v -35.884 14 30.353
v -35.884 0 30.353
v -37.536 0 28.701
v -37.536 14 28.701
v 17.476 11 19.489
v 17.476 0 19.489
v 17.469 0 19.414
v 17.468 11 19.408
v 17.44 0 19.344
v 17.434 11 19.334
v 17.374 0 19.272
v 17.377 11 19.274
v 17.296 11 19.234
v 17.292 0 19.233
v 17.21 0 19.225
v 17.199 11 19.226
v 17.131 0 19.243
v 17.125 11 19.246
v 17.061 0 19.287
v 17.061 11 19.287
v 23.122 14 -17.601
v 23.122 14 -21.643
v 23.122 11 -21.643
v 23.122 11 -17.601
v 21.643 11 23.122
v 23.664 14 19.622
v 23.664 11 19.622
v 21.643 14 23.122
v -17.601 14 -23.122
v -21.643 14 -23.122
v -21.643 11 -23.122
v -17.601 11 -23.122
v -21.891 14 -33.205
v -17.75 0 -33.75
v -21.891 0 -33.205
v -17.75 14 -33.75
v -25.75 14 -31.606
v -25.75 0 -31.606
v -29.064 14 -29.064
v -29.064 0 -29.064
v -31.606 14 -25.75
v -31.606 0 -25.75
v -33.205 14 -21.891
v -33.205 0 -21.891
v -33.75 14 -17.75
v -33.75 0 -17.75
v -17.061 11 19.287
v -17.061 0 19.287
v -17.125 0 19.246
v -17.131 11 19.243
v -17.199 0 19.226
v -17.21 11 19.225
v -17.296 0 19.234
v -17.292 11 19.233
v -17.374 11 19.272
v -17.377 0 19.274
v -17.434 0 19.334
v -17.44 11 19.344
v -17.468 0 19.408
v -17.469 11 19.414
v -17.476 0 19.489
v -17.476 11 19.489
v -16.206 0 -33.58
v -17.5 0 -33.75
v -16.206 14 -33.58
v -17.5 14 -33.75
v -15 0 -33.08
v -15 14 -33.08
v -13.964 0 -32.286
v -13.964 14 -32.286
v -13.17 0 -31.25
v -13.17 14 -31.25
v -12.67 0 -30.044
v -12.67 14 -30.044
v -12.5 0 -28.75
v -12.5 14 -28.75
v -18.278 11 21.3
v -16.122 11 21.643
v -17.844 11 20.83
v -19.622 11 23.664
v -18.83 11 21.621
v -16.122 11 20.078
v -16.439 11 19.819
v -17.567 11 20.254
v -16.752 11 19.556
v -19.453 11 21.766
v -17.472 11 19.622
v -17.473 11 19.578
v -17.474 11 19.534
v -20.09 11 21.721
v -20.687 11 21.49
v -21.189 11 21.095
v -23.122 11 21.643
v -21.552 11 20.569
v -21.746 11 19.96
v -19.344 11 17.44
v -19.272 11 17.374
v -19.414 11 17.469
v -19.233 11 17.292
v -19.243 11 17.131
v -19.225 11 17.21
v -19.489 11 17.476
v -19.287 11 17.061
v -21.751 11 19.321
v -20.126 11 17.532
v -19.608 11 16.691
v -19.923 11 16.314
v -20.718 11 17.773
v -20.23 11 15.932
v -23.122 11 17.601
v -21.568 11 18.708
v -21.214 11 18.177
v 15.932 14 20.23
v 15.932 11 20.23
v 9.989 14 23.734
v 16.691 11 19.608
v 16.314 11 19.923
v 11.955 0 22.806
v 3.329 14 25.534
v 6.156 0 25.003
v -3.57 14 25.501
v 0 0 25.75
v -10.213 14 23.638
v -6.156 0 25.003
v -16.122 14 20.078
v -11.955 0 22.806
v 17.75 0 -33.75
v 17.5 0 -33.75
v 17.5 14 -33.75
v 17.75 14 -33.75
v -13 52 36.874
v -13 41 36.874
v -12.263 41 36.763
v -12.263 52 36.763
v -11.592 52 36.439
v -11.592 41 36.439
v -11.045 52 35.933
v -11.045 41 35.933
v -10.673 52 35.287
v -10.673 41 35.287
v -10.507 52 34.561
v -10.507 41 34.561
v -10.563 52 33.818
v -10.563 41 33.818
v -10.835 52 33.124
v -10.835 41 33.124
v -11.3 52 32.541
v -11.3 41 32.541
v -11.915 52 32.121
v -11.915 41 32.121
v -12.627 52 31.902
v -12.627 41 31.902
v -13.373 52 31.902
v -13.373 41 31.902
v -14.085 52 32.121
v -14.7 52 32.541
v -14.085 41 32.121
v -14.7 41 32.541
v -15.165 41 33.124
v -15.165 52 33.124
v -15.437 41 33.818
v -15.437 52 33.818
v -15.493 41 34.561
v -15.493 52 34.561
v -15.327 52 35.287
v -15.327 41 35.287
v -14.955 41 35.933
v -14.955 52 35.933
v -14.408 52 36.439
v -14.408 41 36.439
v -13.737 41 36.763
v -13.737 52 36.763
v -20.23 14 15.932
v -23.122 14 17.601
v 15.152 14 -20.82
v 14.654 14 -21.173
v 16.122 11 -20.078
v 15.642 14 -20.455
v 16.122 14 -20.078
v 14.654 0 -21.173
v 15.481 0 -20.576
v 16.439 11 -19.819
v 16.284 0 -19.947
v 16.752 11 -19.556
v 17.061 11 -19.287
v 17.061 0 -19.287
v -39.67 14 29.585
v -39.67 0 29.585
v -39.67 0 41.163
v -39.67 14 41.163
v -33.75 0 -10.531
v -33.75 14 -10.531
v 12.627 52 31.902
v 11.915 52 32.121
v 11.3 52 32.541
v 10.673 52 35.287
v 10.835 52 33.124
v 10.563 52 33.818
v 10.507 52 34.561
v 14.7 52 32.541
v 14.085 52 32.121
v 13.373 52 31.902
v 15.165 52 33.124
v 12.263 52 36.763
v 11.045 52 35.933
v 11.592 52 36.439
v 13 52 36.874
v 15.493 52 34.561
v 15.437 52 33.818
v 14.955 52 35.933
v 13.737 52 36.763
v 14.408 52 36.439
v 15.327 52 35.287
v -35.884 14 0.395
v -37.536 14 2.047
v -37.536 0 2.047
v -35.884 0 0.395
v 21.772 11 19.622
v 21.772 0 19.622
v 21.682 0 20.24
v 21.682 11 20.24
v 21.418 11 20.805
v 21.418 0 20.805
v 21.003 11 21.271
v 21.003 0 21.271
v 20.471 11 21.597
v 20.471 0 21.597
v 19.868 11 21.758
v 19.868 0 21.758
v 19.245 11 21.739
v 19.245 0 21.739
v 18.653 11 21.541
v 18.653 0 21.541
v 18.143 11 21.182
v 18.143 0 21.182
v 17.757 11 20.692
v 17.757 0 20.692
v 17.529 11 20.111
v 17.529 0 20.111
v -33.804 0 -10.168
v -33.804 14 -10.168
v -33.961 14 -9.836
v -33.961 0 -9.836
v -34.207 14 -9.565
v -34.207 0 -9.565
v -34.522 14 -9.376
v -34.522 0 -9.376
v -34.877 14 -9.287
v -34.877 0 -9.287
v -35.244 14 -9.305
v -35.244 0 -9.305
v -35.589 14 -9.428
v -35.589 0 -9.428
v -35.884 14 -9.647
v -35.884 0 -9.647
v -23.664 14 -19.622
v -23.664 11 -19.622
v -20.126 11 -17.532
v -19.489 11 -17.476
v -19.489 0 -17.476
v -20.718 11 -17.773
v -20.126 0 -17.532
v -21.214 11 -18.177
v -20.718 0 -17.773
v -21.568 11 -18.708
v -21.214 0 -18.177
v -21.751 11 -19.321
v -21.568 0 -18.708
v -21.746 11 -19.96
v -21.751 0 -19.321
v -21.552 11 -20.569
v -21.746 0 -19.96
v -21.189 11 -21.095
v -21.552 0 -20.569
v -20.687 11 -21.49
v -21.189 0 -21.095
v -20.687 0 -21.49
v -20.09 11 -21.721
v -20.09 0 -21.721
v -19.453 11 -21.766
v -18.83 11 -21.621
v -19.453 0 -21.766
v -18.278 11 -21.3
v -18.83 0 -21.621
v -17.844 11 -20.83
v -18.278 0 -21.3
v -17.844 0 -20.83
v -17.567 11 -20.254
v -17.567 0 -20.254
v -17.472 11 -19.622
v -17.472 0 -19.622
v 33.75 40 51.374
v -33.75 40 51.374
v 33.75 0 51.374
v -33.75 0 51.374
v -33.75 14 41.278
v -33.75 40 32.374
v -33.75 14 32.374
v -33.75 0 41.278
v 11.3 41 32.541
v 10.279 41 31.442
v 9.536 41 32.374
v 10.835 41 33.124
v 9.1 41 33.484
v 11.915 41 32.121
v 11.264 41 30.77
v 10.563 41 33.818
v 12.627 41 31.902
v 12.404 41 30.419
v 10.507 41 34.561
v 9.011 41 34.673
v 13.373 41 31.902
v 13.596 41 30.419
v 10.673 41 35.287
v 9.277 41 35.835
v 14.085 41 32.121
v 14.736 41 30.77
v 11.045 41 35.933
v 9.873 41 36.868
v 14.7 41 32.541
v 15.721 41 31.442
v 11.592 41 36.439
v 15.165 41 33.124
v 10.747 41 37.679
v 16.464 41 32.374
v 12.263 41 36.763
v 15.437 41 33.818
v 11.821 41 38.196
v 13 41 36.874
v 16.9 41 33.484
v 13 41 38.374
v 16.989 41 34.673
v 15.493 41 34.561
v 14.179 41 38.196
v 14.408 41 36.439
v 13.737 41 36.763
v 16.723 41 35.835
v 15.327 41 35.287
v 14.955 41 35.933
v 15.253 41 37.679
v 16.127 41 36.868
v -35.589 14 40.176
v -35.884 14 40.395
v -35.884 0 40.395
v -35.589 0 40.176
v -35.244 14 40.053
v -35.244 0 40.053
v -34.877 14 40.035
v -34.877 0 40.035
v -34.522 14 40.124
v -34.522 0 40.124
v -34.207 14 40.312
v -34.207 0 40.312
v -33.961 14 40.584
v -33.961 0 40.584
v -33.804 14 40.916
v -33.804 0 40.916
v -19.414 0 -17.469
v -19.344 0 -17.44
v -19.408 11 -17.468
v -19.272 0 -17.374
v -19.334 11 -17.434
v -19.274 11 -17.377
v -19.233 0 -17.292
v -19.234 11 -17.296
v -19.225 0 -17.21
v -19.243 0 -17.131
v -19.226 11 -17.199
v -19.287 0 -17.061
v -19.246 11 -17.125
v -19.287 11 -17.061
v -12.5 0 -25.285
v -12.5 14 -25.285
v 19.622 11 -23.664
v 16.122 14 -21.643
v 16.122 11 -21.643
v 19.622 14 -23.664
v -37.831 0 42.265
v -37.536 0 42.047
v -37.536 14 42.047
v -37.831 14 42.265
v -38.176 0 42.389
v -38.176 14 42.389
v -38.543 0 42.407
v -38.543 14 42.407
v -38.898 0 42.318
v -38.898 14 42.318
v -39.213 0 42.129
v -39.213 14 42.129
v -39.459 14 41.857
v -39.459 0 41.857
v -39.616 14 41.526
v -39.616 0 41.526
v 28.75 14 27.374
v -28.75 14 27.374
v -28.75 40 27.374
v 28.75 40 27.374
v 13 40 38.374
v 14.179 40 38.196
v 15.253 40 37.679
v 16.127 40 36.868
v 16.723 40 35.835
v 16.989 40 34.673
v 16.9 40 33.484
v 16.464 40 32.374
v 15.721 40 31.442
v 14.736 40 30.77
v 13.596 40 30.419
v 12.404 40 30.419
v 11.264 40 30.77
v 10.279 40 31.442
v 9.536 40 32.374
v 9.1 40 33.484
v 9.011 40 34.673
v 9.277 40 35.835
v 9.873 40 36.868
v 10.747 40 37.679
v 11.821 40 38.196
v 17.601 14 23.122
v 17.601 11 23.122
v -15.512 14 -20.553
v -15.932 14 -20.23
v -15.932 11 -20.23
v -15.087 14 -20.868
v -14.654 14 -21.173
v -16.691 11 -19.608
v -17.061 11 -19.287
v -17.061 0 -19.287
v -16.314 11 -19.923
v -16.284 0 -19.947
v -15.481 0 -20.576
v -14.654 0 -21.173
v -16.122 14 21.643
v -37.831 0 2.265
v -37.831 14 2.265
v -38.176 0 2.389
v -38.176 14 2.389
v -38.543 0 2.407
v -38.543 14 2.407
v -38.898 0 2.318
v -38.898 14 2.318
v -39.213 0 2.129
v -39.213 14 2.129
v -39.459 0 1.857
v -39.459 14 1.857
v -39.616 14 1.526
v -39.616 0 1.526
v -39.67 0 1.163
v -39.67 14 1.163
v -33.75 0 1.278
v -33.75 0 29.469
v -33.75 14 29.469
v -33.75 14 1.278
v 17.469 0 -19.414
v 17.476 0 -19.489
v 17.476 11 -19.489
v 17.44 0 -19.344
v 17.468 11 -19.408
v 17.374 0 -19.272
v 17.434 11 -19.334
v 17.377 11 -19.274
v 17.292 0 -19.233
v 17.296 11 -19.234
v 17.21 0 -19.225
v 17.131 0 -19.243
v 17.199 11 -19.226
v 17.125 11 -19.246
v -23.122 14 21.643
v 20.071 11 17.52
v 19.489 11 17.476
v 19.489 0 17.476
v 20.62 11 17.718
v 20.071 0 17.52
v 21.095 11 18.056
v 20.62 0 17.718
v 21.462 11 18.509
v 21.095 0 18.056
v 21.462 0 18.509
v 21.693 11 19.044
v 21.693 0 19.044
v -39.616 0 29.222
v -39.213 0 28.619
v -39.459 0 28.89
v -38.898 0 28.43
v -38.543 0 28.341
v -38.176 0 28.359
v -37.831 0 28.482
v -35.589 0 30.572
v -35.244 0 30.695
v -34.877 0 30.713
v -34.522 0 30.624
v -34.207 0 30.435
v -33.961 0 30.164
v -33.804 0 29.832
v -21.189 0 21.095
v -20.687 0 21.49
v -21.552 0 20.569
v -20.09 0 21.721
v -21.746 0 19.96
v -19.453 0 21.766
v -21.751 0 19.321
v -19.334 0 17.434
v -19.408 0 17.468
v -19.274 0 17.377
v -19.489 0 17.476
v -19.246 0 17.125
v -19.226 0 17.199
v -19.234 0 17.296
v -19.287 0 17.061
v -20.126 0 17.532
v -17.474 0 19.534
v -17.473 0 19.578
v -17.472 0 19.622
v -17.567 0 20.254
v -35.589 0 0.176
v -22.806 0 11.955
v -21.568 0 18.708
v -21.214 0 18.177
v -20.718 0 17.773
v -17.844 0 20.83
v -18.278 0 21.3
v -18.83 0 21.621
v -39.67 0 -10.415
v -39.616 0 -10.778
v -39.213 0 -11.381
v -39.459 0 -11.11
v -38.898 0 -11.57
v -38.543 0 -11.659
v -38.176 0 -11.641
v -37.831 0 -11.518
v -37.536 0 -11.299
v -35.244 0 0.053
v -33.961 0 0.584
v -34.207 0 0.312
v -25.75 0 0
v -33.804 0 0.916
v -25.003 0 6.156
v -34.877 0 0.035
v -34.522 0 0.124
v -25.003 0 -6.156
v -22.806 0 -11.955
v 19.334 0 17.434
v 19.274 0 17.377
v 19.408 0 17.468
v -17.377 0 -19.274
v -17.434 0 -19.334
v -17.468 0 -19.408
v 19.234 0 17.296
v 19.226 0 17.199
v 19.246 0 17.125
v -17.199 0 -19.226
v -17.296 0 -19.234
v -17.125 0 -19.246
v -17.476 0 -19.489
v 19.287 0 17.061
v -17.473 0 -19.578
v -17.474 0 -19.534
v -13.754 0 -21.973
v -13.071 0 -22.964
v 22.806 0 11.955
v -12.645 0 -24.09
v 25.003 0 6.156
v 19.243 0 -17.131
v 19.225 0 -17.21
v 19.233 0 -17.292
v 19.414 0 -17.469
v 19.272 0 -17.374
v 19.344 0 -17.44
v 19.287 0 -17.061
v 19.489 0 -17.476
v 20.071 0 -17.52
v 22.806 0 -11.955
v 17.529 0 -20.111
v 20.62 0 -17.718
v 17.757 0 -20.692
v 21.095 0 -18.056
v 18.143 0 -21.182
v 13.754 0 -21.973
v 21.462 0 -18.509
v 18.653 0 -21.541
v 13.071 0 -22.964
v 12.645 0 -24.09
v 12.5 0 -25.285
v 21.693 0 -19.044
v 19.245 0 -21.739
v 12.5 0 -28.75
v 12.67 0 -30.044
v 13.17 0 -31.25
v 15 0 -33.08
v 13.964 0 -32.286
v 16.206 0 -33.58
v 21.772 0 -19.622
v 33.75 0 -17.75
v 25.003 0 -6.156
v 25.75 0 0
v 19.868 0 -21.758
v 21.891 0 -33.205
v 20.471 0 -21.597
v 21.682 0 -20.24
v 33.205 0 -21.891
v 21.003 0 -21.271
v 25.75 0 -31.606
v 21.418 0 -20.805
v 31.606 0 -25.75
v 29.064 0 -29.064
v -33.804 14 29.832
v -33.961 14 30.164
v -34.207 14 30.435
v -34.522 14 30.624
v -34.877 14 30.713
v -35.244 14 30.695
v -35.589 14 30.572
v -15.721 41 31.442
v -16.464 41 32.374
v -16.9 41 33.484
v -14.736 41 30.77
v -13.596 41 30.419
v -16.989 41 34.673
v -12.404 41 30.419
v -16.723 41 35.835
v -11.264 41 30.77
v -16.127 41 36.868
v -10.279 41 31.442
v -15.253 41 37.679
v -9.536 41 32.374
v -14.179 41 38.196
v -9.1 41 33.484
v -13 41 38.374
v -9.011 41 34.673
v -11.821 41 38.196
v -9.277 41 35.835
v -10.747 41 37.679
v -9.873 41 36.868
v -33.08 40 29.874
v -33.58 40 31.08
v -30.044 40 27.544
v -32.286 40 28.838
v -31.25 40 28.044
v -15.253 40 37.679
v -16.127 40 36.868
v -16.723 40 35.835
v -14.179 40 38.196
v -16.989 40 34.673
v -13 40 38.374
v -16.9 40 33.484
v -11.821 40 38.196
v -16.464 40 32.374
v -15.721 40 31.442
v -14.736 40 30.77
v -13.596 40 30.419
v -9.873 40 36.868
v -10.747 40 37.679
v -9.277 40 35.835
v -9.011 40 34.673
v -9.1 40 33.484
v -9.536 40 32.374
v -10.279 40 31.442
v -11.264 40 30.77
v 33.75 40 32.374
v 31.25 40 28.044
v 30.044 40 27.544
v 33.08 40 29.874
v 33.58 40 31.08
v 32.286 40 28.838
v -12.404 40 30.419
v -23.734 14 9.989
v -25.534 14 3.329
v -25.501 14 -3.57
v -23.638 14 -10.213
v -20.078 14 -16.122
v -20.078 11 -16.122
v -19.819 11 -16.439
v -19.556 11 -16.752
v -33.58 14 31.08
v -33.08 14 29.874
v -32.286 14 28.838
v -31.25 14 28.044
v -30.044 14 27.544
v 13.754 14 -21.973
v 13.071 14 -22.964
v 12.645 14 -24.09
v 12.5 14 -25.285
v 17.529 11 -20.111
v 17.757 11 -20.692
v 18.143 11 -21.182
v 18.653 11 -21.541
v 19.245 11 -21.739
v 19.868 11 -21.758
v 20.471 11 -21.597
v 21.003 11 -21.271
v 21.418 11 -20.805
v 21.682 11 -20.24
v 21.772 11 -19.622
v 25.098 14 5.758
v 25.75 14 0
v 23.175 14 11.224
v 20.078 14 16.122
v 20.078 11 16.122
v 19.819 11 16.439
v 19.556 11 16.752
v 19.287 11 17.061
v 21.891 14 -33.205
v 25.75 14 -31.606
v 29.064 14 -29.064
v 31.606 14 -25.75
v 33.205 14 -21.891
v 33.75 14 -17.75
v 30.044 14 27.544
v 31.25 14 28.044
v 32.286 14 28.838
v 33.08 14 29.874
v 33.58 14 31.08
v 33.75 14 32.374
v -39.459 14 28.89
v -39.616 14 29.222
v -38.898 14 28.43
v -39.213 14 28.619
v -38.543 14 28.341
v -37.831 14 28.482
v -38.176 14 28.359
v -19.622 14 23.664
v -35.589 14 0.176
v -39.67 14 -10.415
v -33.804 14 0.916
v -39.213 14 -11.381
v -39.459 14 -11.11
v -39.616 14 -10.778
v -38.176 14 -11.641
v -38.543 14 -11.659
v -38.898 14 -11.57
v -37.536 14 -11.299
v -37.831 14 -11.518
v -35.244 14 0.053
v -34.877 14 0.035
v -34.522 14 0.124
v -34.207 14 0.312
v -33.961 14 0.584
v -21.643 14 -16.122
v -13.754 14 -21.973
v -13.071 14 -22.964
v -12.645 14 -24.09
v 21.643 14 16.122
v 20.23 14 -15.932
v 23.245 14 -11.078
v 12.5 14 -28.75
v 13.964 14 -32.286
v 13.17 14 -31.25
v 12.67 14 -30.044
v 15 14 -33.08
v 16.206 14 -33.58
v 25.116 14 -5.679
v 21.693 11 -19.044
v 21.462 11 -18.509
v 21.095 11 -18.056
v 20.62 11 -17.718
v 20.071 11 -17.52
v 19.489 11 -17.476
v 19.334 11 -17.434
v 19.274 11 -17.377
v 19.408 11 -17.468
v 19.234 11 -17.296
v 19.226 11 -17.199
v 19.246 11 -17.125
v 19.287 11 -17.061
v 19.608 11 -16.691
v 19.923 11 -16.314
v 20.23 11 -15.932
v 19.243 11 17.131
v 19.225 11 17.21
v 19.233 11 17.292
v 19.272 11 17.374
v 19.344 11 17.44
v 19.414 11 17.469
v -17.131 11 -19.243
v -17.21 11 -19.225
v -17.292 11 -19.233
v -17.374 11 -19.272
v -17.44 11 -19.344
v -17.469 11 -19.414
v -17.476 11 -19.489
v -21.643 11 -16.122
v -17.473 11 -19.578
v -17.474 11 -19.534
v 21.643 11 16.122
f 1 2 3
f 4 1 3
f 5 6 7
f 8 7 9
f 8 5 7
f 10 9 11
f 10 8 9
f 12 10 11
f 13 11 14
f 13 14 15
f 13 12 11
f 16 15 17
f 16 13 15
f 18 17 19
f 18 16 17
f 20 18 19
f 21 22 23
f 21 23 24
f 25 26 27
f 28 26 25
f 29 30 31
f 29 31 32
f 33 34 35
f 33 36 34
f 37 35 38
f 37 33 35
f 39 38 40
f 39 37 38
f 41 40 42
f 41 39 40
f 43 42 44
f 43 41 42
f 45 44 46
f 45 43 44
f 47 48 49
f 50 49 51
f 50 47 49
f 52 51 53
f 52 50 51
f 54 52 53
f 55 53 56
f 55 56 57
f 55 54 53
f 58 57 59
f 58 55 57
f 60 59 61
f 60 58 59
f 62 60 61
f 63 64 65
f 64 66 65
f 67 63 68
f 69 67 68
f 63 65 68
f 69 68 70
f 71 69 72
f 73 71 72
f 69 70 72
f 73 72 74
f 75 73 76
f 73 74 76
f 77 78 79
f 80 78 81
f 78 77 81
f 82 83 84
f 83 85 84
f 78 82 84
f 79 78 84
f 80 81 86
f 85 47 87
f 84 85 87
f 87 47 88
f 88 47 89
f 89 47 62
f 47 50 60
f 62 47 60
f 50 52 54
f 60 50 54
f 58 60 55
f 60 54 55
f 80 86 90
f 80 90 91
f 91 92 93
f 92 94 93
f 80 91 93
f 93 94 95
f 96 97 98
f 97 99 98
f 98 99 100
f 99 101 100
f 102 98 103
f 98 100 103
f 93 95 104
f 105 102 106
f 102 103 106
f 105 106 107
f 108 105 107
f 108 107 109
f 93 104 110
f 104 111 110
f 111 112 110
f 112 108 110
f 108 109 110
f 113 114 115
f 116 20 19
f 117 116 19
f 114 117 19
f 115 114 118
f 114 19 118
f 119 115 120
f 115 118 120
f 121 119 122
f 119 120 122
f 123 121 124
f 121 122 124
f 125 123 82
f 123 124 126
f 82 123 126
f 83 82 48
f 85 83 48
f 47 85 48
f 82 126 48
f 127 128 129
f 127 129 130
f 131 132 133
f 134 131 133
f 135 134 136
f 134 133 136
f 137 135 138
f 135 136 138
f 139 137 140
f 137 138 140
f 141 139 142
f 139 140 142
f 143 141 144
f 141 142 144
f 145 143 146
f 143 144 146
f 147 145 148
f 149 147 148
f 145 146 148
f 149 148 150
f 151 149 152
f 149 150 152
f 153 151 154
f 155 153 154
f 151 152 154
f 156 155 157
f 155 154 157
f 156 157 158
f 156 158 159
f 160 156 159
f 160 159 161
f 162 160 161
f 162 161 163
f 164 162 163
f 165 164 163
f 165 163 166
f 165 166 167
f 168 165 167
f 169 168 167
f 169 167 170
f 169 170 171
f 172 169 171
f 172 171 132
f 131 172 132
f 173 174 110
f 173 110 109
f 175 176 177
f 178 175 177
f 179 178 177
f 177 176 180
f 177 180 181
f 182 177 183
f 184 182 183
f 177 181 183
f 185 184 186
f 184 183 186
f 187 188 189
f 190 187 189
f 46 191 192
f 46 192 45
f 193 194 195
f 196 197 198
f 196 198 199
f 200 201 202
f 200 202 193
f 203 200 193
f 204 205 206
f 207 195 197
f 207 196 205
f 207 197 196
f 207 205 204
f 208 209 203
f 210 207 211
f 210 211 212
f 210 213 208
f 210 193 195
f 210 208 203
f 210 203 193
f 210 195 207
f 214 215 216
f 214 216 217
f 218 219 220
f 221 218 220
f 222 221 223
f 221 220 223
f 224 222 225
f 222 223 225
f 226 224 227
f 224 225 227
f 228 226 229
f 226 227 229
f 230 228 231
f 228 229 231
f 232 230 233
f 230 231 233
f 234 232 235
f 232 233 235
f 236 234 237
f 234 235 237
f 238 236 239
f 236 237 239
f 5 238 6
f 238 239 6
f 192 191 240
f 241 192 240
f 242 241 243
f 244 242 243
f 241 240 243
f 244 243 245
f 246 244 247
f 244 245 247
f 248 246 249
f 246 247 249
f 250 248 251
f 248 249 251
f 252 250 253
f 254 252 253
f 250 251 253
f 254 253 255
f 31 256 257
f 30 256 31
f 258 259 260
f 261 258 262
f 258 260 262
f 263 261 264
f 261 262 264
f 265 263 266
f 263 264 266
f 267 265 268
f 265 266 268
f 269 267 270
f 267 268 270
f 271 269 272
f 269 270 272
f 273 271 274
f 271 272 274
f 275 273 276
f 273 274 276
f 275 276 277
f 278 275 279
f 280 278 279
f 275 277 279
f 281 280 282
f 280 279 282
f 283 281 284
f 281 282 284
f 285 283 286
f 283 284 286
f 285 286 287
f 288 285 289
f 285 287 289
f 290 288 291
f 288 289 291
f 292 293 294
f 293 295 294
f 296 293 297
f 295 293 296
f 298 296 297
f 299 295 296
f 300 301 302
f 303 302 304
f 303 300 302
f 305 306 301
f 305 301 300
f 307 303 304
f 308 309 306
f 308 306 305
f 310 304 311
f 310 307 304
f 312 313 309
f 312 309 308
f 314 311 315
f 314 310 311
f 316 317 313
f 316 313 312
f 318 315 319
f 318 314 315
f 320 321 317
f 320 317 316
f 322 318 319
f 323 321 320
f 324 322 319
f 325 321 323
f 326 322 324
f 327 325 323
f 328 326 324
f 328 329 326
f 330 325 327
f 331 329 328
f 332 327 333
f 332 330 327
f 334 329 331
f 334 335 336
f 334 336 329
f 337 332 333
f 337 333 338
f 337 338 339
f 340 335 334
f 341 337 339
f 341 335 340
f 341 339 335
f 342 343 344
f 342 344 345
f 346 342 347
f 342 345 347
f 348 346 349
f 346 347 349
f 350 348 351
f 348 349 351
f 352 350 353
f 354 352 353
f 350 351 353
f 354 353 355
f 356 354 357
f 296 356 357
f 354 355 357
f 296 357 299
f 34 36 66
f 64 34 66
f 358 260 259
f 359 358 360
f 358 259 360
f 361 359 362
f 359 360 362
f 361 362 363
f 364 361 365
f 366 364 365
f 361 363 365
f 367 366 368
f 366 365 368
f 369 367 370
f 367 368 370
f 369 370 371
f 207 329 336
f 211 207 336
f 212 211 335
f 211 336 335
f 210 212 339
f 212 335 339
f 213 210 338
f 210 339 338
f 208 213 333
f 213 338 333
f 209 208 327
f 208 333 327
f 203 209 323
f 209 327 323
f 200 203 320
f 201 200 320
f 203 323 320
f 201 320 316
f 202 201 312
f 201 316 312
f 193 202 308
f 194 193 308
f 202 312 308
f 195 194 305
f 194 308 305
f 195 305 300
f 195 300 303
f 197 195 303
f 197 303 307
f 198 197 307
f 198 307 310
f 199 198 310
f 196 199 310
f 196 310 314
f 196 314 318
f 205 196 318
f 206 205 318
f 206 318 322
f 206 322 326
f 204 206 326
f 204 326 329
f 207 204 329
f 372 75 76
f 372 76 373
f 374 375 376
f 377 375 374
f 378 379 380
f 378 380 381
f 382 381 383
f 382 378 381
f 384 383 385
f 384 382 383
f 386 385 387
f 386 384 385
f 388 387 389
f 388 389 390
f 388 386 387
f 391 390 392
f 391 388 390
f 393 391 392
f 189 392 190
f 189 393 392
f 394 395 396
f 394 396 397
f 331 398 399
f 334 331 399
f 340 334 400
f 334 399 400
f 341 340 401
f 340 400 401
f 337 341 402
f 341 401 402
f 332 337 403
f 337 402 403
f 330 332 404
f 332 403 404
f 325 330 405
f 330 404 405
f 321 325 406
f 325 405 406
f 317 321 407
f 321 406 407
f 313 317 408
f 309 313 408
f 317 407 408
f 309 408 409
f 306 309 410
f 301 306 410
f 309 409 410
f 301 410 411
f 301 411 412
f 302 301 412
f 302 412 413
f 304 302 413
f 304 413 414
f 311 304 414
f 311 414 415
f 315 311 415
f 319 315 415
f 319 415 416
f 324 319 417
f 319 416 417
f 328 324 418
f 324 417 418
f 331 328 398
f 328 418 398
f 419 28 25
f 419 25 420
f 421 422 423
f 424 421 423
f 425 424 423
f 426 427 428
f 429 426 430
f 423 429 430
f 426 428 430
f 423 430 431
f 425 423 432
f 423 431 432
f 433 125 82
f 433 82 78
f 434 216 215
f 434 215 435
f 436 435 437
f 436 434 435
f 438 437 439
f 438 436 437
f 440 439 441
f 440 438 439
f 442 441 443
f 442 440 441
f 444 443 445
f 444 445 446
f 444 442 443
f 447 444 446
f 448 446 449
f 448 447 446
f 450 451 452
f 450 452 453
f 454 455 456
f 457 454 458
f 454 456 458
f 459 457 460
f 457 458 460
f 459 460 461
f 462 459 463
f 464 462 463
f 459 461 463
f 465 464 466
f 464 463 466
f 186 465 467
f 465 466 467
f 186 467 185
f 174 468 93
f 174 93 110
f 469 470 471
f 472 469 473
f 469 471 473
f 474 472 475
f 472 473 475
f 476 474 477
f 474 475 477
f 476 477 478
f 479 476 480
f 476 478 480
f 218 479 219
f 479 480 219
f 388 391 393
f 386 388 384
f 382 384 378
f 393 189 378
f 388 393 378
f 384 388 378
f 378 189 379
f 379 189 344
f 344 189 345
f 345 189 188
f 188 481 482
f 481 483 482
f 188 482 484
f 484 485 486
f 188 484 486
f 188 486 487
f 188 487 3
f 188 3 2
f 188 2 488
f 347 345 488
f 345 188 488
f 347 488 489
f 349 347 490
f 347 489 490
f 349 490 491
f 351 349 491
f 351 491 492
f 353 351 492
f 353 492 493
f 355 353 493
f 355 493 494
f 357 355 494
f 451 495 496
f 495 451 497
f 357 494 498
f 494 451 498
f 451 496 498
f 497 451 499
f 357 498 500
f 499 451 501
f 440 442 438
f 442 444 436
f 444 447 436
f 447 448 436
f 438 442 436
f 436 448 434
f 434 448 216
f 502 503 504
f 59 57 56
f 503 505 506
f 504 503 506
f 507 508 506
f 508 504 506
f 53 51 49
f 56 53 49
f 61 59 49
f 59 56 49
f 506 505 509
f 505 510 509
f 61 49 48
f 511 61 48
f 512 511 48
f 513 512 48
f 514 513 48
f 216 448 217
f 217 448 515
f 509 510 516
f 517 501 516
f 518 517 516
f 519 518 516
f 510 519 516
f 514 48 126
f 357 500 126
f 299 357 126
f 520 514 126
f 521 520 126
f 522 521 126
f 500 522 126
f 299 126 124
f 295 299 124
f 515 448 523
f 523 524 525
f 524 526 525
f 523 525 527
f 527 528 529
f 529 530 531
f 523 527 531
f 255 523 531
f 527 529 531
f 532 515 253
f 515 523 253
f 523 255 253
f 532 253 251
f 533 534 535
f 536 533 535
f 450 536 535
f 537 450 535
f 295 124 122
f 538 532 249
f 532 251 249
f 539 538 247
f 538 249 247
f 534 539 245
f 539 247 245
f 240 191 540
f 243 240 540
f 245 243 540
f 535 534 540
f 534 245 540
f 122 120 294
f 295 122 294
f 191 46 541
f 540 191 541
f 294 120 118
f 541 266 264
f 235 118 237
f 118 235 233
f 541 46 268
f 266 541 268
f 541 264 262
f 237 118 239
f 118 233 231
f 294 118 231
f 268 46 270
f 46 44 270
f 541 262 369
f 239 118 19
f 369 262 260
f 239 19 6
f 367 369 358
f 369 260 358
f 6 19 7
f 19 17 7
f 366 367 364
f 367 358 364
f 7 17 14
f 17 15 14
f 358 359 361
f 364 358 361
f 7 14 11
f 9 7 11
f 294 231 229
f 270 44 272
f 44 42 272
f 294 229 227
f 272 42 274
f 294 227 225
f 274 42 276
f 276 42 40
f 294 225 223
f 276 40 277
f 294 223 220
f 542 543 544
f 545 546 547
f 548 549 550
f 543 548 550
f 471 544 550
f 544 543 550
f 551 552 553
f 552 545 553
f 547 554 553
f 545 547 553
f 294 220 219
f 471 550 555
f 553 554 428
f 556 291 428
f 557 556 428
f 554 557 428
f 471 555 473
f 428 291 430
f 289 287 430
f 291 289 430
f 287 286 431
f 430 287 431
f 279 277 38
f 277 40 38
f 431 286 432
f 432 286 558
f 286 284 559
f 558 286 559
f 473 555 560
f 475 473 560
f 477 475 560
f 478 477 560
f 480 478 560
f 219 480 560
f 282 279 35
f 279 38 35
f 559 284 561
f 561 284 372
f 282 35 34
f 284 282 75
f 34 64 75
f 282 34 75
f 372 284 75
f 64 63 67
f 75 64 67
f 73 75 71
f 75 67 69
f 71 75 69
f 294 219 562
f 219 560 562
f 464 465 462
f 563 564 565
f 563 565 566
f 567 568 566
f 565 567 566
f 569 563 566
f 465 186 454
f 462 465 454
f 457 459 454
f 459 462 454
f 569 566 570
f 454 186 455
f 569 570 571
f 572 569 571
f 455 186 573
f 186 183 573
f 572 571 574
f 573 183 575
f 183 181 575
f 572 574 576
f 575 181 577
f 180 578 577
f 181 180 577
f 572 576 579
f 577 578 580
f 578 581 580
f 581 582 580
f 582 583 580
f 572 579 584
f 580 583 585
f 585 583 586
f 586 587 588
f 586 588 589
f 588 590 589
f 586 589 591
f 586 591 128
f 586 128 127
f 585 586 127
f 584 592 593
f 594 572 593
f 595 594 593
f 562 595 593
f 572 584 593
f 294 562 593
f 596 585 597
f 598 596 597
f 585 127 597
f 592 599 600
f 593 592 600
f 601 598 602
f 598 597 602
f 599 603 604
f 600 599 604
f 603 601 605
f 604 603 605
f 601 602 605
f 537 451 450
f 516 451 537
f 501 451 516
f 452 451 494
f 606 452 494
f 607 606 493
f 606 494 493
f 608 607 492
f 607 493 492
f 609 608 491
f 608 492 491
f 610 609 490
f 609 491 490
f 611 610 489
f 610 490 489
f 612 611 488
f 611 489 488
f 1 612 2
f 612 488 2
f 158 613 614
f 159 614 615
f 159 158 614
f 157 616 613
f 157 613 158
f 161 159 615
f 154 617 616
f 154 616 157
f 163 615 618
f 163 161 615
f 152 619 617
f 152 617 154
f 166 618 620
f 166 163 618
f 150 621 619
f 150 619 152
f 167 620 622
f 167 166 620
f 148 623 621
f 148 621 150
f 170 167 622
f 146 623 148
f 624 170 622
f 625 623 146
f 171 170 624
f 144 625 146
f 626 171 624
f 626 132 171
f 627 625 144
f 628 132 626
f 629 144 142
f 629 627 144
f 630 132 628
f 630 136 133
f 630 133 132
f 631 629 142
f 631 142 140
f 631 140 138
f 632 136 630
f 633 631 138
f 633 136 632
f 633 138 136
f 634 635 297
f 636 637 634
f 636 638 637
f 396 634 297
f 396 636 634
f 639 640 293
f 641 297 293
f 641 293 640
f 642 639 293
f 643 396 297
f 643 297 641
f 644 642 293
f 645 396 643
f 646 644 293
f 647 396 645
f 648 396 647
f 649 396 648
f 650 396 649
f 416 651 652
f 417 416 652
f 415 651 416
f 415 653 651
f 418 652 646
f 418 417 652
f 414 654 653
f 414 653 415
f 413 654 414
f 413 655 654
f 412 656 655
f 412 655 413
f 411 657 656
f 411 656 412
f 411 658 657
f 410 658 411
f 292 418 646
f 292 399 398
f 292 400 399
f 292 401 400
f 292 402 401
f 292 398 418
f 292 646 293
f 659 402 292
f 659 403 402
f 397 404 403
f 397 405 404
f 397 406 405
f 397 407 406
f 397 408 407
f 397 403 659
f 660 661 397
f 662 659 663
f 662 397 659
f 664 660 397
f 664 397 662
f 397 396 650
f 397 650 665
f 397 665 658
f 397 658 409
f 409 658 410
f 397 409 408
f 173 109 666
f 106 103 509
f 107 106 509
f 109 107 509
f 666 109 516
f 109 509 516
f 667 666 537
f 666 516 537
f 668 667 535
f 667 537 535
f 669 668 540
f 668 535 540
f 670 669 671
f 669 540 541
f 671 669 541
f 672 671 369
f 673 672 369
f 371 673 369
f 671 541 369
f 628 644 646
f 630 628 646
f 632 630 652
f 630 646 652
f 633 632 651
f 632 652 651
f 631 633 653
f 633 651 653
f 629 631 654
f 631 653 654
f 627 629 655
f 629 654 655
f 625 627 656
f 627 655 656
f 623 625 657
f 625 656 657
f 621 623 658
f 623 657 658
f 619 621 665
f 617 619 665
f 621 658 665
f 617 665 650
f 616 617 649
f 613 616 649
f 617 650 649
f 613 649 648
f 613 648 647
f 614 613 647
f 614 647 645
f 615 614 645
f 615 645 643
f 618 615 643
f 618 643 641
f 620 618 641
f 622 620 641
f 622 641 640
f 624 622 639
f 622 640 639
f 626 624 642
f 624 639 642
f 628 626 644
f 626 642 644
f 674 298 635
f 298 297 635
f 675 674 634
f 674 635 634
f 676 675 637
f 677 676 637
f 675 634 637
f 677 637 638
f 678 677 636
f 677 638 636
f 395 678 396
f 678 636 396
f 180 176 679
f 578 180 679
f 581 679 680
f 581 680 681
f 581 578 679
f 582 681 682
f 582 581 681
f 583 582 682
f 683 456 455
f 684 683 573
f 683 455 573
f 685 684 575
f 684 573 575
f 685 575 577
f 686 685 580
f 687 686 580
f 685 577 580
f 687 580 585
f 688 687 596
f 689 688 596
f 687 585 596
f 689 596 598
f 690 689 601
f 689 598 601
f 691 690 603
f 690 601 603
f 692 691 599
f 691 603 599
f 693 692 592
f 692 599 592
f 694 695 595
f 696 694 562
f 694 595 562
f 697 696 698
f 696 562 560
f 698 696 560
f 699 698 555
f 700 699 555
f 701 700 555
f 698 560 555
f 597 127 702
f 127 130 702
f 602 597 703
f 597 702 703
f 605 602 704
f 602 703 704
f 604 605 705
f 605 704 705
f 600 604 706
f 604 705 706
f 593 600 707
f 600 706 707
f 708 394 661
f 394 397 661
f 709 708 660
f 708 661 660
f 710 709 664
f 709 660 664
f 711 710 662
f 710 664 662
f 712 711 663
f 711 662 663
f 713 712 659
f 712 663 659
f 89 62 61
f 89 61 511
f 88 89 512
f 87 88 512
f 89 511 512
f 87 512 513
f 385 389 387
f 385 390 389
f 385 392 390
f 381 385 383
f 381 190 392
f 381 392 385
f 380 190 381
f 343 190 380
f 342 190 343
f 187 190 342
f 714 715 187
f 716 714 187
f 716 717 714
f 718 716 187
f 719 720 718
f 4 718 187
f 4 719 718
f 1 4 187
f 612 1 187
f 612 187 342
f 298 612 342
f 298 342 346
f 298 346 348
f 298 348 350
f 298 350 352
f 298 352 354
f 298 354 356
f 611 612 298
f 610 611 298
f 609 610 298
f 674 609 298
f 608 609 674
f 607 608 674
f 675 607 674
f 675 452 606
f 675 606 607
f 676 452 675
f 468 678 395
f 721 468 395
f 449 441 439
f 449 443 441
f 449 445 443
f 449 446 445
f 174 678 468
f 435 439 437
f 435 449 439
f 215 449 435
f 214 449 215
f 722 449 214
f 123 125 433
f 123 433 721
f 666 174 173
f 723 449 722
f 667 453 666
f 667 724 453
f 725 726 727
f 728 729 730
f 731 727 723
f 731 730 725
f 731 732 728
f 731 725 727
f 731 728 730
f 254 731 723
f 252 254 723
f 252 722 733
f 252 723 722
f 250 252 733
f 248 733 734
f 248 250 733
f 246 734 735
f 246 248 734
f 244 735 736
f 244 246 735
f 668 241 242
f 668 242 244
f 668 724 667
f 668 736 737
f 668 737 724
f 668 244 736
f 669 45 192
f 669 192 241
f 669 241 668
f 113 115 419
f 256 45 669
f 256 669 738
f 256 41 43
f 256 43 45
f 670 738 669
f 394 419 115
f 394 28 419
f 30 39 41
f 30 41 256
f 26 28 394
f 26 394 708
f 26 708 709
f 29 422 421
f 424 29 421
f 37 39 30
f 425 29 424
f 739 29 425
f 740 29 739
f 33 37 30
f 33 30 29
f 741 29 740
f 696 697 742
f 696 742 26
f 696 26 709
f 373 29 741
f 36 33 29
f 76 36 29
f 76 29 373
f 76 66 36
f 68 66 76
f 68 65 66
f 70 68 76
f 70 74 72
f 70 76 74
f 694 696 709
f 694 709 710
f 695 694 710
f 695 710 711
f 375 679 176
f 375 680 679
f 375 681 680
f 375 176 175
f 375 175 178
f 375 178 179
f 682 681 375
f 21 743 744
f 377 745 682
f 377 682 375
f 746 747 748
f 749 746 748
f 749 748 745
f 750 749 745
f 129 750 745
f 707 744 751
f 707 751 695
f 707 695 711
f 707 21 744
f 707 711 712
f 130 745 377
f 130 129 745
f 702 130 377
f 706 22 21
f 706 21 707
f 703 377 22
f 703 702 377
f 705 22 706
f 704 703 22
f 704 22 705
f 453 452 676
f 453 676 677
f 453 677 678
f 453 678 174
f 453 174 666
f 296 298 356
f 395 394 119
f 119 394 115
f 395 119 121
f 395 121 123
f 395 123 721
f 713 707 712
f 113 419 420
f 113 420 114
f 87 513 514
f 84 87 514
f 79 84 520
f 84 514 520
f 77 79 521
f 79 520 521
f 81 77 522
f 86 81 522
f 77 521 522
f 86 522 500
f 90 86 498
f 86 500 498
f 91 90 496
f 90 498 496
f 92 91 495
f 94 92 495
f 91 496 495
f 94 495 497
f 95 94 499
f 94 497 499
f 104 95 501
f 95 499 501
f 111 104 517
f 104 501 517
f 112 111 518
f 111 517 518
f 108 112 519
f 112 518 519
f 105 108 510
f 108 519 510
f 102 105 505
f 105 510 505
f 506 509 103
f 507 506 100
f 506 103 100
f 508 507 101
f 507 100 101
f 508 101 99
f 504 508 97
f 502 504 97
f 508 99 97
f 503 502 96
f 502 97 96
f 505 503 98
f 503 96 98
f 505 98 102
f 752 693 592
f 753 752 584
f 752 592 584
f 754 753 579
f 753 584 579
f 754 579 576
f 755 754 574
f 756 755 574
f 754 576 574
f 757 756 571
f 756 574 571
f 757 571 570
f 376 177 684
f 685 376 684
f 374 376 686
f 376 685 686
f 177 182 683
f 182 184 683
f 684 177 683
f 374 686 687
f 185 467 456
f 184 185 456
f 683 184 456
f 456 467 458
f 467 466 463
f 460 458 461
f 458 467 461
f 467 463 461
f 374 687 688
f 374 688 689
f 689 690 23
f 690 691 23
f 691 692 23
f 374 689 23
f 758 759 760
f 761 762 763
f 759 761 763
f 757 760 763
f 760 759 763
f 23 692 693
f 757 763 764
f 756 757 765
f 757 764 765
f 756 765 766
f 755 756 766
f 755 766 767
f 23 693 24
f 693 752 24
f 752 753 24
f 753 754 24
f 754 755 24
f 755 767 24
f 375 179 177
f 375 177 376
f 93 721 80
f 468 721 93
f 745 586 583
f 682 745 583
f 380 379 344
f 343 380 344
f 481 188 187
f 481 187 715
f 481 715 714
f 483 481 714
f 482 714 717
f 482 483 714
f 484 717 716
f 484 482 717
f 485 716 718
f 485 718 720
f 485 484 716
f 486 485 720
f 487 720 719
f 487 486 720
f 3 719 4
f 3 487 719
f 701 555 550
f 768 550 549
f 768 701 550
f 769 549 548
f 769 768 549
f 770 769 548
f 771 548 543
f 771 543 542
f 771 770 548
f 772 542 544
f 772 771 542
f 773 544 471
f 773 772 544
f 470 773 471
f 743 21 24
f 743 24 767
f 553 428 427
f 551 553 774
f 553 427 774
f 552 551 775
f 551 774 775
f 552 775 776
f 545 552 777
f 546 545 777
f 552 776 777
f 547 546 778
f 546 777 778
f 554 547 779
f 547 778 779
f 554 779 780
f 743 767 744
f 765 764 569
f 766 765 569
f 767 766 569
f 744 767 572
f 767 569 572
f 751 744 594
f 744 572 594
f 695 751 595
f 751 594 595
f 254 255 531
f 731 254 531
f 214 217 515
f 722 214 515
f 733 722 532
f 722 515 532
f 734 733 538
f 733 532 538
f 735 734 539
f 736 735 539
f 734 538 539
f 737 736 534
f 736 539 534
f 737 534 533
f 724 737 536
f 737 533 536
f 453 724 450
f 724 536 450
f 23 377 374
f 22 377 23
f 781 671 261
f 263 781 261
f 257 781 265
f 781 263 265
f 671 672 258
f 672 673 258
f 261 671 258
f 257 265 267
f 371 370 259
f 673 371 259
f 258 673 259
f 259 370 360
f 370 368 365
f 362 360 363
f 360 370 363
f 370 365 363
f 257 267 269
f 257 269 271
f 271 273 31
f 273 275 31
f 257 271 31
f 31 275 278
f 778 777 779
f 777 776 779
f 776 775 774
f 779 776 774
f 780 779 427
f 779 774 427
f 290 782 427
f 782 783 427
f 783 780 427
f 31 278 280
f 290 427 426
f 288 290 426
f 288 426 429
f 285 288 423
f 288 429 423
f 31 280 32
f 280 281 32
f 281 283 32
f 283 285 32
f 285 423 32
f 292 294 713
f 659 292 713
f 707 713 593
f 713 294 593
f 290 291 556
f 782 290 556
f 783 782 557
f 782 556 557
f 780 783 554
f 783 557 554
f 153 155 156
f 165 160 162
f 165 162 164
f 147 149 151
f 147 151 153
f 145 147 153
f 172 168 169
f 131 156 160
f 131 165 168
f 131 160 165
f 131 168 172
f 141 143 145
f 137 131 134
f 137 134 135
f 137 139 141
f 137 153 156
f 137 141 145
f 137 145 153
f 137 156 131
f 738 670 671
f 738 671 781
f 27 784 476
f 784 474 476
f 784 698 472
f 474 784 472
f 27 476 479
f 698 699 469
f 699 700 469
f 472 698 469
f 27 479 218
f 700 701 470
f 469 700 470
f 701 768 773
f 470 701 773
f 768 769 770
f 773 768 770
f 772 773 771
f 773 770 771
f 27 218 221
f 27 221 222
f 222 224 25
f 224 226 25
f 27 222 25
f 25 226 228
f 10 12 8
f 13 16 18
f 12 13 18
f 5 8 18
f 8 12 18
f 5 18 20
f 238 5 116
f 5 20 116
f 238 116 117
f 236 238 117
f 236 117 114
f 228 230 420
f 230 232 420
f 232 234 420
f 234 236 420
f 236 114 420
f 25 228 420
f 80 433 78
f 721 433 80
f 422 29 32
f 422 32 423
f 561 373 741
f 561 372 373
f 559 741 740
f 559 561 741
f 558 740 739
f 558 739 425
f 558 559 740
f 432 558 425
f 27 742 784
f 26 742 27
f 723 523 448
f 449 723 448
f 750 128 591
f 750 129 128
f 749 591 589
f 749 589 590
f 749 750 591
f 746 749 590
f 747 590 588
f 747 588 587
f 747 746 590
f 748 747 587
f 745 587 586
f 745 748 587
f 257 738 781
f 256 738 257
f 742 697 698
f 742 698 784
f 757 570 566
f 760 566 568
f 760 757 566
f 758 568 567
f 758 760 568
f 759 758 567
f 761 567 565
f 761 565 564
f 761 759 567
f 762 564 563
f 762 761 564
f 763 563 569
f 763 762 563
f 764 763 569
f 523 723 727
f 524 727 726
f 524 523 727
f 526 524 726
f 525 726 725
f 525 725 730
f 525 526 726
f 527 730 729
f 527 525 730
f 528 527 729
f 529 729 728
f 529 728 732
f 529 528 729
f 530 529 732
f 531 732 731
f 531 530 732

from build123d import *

# Parameters (mm, degrees)
SKETCH1_W           = 67.5
SKETCH1_H           = 85.123863618
BOSS_EXTRUDE1_DEPTH = 14
SKETCH2_W           = 67.5
SKETCH2_H           = 24
BOSS_EXTRUDE2_DEPTH = 26
SKETCH3_R           = 2.5
BOSS_EXTRUDE3_DEPTH = 12
FILLET1_R           = 0.25
SKETCH4_R           = 4
BOSS_EXTRUDE4_DEPTH = 1
SKETCH5_W           = 25
SKETCH5_H           = 20
CUT_EXTRUDE1_DEPTH  = 81.512957839
FILLET2_R           = 5
FILLET3_R           = 16
BOSS_EXTRUDE5_DEPTH = 14
CUT_EXTRUDE2_DEPTH  = 84.206588569
FILLET4_START       = -1
FILLET4_DEPTH       = 15
FILLET4_2_DEPTH     = 14
CUT_EXTRUDE3_DEPTH  = 3
CIRPATTERN1_COUNT   = 4


with BuildPart() as part:
    # Sketch1 → Boss-Extrude1 (new body)
    with BuildSketch(Plane(origin=(0, 0, 0), x_dir=(1, 0, 0), z_dir=(0, 1, 0))):
        with Locations((0, -8.811931809)):
            Rectangle(SKETCH1_W, SKETCH1_H)
        with BuildLine():
            ThreePointArc((18.737427526, 17.66270958), (23.93273134, 9.50194036), (25.75, 0))
            ThreePointArc((25.75, 0), (23.93273134, -9.50194036), (18.737427526, -17.66270958))
            ThreePointArc((18.737427526, -17.66270958), (20.788448756, -17.816003175), (21.772213178, -19.622213178))
            ThreePointArc((21.772213178, -19.622213178), (19.169682922, -21.724049605), (17.66270958, -18.737427526))
            ThreePointArc((17.66270958, -18.737427526), (0, -25.75), (-17.66270958, -18.737427526))
            ThreePointArc((-17.66270958, -18.737427526), (-17.52037675, -19.169682922), (-17.472213178, -19.622213178))
            ThreePointArc((-17.472213178, -19.622213178), (-21.428423181, -20.788448756), (-18.737427526, -17.66270958))
            ThreePointArc((-18.737427526, -17.66270958), (-25.75, 0), (-18.737427526, 17.66270958))
            ThreePointArc((-18.737427526, 17.66270958), (-21.428423181, 20.788448756), (-17.472213178, 19.622213178))
            ThreePointArc((-17.472213178, 19.622213178), (-17.52037675, 19.169682922), (-17.66270958, 18.737427526))
            ThreePointArc((-17.66270958, 18.737427526), (0, 25.75), (17.66270958, 18.737427526))
            ThreePointArc((17.66270958, 18.737427526), (19.169682922, 21.724049605), (21.772213178, 19.622213178))
            ThreePointArc((21.772213178, 19.622213178), (20.788448756, 17.816003175), (18.737427526, 17.66270958))
        make_face(mode=Mode.SUBTRACT)
    extrude(amount=BOSS_EXTRUDE1_DEPTH)

    # Sketch2 → Boss-Extrude2 (add)
    with BuildSketch(Plane(origin=(0, 14, 0), x_dir=(1, 0, 0), z_dir=(0, 1, 0))):
        with Locations((0, -39.373863618)):
            Rectangle(SKETCH2_W, SKETCH2_H)
    extrude(amount=BOSS_EXTRUDE2_DEPTH)

    # Sketch3 → Boss-Extrude3 (add)
    with BuildSketch(Plane(origin=(0, 40, 0), x_dir=(1, 0, 0), z_dir=(0, 1, 0))):
        with Locations(Location((13, -34.373863618, 0), (0, 0, 270))):
            Circle(SKETCH3_R)
        with Locations(Location((-13, -34.373863618, 0), (0, 0, 270))):
            Circle(SKETCH3_R)
    extrude(amount=BOSS_EXTRUDE3_DEPTH)

    # Fillet1
    fillet1_edges = [part.edges().sort_by_distance(p)[0] for p in [
        (-17.66270958, 7, 18.737427526),
        (17.66270958, 7, 18.737427526),
        (18.737427526, 7, 17.66270958),
        (18.737427526, 7, -17.66270958),
        (17.66270958, 7, -18.737427526),
        (-17.66270958, 7, -18.737427526),
        (-18.737427526, 7, -17.66270958),
        (-18.737427526, 7, 17.66270958),
    ]]
    fillet(fillet1_edges, radius=FILLET1_R)

    # Sketch4 → Boss-Extrude4 (add)
    with BuildSketch(Plane(origin=(0, 40, 0), x_dir=(1, 0, 0), z_dir=(0, 1, 0))):
        with Locations(Location((13, -34.373863618, 0), (0, 0, 270))):
            Circle(SKETCH4_R)
        with Locations(Location((-13, -34.373863618, 0), (0, 0, 270))):
            Circle(SKETCH4_R)
    extrude(amount=BOSS_EXTRUDE4_DEPTH)

    # Sketch5 → Cut-Extrude1 (cut, through all)
    with BuildSketch(Plane.XZ):
        with Locations((0, -23.75)):
            Rectangle(SKETCH5_W, SKETCH5_H)
    extrude(amount=-CUT_EXTRUDE1_DEPTH, mode=Mode.SUBTRACT)

    # Fillet2
    fillet2_edges = [part.edges().sort_by_distance(p)[0] for p in [
        (12.5, 7, -22.51249653),
        (-12.5, 7, -22.51249653),
        (12.5, 7, -33.75),
        (-12.5, 7, -33.75),
        (-33.75, 27, 27.373863618),
        (33.75, 27, 27.373863618),
    ]]
    fillet(fillet2_edges, radius=FILLET2_R)

    # Fillet3
    fillet3_edges = [part.edges().sort_by_distance(p)[0] for p in [
        (33.75, 7, -33.75),
        (-33.75, 7, -33.75),
    ]]
    fillet(fillet3_edges, radius=FILLET3_R)

    # Sketch6 → Boss-Extrude5 (add)
    with BuildSketch(Plane.XZ):
        Polygon((-33.75, 38.373863618), (-39.75, 44.373863618), (-39.75, 26.373863618), (-33.75, 32.373863618), align=None)
        Polygon((-39.75, 4.373863618), (-33.75, -1.626136382), (-33.75, -7.626136382), (-39.75, -13.626136382), align=None)
    extrude(amount=-BOSS_EXTRUDE5_DEPTH)

    # Sketch7 → Cut-Extrude2 (cut, through all)
    with BuildSketch(Plane.XZ):
        Polygon((-33.75, -7.626136382), (-33.75, -7.512999297), (-39.67, -13.432999297), (-39.67, 4.180726533), (-33.75, -1.739273467), (-33.75, -1.626136382), (-39.75, 4.373863618), (-39.75, -13.626136382), align=None)
        Polygon((-33.75, 32.373863618), (-33.75, 32.487000703), (-39.67, 26.567000703), (-39.67, 44.180726533), (-33.75, 38.260726533), (-33.75, 38.373863618), (-39.75, 44.373863618), (-39.75, 26.373863618), align=None)
    extrude(amount=-CUT_EXTRUDE2_DEPTH, mode=Mode.SUBTRACT)

    # Fillet4: read off the stored shape, not the designer's step
    # Fillet4 outline → Fillet4 (cut)
    with BuildSketch(Plane(origin=(0, 0, 0), x_dir=(1, 0, 0), z_dir=(0, 1, 0)).offset(FILLET4_START)):
        with BuildLine():
            Line((-39.67, -26.567000703), (-39.67, -29.584767656))
            ThreePointArc((-39.67, -29.584767656), (-38.898354291, -28.42991824), (-37.536116524, -28.700884179))
            Line((-37.536116524, -28.700884179), (-39.67, -26.567000703))
        make_face()
        with BuildLine():
            Line((-39.67, 13.432999297), (-39.67, 10.415232344))
            ThreePointArc((-39.67, 10.415232344), (-38.898354291, 11.57008176), (-37.536116524, 11.299115821))
            Line((-37.536116524, 11.299115821), (-39.67, 13.432999297))
        make_face()
        with BuildLine():
            Line((-39.67, -4.180726533), (-37.536116524, -2.046843056))
            ThreePointArc((-37.536116524, -2.046843056), (-38.89835429, -2.317808995), (-39.67, -1.16295958))
            Line((-39.67, -1.16295958), (-39.67, -4.180726533))
        make_face()
        with BuildLine():
            ThreePointArc((-37.536116524, -42.046843056), (-38.89835429, -42.317808995), (-39.67, -41.16295958))
            Line((-39.67, -41.16295958), (-39.67, -44.180726533))
            Line((-39.67, -44.180726533), (-37.536116524, -42.046843056))
        make_face()
    extrude(amount=FILLET4_DEPTH, mode=Mode.SUBTRACT)

    # Fillet4 2 outline → Fillet4 2 (add)
    with BuildSketch(Plane(origin=(0, 0, 0), x_dir=(1, 0, 0), z_dir=(0, 1, 0))):
        with BuildLine():
            ThreePointArc((-33.75, 10.53076625), (-34.52164571, 9.375916835), (-35.883883476, 9.646882774))
            Line((-35.883883476, 9.646882774), (-33.75, 7.512999297))
            Line((-33.75, 7.512999297), (-33.75, 10.53076625))
        make_face()
        with BuildLine():
            ThreePointArc((-35.883883476, -0.394610009), (-34.521645709, -0.12364407), (-33.75, -1.278493486))
            Line((-33.75, -1.278493486), (-33.75, 1.739273467))
            Line((-33.75, 1.739273467), (-35.883883476, -0.394610009))
        make_face()
        with BuildLine():
            ThreePointArc((-33.75, -29.46923375), (-34.52164571, -30.624083165), (-35.883883476, -30.353117226))
            Line((-35.883883476, -30.353117226), (-33.75, -32.487000703))
            Line((-33.75, -32.487000703), (-33.75, -29.46923375))
        make_face()
        with BuildLine():
            Line((-33.75, -38.260726533), (-35.883883476, -40.394610009))
            ThreePointArc((-35.883883476, -40.394610009), (-34.521645709, -40.12364407), (-33.75, -41.278493486))
            Line((-33.75, -41.278493486), (-33.75, -38.260726533))
        make_face()
    extrude(amount=FILLET4_2_DEPTH)

    # Sketch8 → Cut-Extrude3 (cut)
    with BuildSketch(Plane(origin=(0, 14, 0), x_dir=(1, 0, 0), z_dir=(0, 1, 0))):
        Polygon((-19.622213178, -15.580761294), (-16.122213178, -17.601487236), (-16.122213178, -21.64293912), (-19.622213178, -23.663665062), (-23.122213178, -21.64293912), (-23.122213178, -17.601487236), align=None)
    cut_extrude3 = extrude(amount=-CUT_EXTRUDE3_DEPTH, mode=Mode.SUBTRACT)

    # CirPattern1: Cut-Extrude3 ×4 about axis
    cirpattern1_axis = Axis((0, 0, 0), (0, 1, 0))
    for i in range(1, CIRPATTERN1_COUNT):
        add(cut_extrude3.rotate(cirpattern1_axis, i * 360 / CIRPATTERN1_COUNT), mode=Mode.SUBTRACT)


solid = part.part
